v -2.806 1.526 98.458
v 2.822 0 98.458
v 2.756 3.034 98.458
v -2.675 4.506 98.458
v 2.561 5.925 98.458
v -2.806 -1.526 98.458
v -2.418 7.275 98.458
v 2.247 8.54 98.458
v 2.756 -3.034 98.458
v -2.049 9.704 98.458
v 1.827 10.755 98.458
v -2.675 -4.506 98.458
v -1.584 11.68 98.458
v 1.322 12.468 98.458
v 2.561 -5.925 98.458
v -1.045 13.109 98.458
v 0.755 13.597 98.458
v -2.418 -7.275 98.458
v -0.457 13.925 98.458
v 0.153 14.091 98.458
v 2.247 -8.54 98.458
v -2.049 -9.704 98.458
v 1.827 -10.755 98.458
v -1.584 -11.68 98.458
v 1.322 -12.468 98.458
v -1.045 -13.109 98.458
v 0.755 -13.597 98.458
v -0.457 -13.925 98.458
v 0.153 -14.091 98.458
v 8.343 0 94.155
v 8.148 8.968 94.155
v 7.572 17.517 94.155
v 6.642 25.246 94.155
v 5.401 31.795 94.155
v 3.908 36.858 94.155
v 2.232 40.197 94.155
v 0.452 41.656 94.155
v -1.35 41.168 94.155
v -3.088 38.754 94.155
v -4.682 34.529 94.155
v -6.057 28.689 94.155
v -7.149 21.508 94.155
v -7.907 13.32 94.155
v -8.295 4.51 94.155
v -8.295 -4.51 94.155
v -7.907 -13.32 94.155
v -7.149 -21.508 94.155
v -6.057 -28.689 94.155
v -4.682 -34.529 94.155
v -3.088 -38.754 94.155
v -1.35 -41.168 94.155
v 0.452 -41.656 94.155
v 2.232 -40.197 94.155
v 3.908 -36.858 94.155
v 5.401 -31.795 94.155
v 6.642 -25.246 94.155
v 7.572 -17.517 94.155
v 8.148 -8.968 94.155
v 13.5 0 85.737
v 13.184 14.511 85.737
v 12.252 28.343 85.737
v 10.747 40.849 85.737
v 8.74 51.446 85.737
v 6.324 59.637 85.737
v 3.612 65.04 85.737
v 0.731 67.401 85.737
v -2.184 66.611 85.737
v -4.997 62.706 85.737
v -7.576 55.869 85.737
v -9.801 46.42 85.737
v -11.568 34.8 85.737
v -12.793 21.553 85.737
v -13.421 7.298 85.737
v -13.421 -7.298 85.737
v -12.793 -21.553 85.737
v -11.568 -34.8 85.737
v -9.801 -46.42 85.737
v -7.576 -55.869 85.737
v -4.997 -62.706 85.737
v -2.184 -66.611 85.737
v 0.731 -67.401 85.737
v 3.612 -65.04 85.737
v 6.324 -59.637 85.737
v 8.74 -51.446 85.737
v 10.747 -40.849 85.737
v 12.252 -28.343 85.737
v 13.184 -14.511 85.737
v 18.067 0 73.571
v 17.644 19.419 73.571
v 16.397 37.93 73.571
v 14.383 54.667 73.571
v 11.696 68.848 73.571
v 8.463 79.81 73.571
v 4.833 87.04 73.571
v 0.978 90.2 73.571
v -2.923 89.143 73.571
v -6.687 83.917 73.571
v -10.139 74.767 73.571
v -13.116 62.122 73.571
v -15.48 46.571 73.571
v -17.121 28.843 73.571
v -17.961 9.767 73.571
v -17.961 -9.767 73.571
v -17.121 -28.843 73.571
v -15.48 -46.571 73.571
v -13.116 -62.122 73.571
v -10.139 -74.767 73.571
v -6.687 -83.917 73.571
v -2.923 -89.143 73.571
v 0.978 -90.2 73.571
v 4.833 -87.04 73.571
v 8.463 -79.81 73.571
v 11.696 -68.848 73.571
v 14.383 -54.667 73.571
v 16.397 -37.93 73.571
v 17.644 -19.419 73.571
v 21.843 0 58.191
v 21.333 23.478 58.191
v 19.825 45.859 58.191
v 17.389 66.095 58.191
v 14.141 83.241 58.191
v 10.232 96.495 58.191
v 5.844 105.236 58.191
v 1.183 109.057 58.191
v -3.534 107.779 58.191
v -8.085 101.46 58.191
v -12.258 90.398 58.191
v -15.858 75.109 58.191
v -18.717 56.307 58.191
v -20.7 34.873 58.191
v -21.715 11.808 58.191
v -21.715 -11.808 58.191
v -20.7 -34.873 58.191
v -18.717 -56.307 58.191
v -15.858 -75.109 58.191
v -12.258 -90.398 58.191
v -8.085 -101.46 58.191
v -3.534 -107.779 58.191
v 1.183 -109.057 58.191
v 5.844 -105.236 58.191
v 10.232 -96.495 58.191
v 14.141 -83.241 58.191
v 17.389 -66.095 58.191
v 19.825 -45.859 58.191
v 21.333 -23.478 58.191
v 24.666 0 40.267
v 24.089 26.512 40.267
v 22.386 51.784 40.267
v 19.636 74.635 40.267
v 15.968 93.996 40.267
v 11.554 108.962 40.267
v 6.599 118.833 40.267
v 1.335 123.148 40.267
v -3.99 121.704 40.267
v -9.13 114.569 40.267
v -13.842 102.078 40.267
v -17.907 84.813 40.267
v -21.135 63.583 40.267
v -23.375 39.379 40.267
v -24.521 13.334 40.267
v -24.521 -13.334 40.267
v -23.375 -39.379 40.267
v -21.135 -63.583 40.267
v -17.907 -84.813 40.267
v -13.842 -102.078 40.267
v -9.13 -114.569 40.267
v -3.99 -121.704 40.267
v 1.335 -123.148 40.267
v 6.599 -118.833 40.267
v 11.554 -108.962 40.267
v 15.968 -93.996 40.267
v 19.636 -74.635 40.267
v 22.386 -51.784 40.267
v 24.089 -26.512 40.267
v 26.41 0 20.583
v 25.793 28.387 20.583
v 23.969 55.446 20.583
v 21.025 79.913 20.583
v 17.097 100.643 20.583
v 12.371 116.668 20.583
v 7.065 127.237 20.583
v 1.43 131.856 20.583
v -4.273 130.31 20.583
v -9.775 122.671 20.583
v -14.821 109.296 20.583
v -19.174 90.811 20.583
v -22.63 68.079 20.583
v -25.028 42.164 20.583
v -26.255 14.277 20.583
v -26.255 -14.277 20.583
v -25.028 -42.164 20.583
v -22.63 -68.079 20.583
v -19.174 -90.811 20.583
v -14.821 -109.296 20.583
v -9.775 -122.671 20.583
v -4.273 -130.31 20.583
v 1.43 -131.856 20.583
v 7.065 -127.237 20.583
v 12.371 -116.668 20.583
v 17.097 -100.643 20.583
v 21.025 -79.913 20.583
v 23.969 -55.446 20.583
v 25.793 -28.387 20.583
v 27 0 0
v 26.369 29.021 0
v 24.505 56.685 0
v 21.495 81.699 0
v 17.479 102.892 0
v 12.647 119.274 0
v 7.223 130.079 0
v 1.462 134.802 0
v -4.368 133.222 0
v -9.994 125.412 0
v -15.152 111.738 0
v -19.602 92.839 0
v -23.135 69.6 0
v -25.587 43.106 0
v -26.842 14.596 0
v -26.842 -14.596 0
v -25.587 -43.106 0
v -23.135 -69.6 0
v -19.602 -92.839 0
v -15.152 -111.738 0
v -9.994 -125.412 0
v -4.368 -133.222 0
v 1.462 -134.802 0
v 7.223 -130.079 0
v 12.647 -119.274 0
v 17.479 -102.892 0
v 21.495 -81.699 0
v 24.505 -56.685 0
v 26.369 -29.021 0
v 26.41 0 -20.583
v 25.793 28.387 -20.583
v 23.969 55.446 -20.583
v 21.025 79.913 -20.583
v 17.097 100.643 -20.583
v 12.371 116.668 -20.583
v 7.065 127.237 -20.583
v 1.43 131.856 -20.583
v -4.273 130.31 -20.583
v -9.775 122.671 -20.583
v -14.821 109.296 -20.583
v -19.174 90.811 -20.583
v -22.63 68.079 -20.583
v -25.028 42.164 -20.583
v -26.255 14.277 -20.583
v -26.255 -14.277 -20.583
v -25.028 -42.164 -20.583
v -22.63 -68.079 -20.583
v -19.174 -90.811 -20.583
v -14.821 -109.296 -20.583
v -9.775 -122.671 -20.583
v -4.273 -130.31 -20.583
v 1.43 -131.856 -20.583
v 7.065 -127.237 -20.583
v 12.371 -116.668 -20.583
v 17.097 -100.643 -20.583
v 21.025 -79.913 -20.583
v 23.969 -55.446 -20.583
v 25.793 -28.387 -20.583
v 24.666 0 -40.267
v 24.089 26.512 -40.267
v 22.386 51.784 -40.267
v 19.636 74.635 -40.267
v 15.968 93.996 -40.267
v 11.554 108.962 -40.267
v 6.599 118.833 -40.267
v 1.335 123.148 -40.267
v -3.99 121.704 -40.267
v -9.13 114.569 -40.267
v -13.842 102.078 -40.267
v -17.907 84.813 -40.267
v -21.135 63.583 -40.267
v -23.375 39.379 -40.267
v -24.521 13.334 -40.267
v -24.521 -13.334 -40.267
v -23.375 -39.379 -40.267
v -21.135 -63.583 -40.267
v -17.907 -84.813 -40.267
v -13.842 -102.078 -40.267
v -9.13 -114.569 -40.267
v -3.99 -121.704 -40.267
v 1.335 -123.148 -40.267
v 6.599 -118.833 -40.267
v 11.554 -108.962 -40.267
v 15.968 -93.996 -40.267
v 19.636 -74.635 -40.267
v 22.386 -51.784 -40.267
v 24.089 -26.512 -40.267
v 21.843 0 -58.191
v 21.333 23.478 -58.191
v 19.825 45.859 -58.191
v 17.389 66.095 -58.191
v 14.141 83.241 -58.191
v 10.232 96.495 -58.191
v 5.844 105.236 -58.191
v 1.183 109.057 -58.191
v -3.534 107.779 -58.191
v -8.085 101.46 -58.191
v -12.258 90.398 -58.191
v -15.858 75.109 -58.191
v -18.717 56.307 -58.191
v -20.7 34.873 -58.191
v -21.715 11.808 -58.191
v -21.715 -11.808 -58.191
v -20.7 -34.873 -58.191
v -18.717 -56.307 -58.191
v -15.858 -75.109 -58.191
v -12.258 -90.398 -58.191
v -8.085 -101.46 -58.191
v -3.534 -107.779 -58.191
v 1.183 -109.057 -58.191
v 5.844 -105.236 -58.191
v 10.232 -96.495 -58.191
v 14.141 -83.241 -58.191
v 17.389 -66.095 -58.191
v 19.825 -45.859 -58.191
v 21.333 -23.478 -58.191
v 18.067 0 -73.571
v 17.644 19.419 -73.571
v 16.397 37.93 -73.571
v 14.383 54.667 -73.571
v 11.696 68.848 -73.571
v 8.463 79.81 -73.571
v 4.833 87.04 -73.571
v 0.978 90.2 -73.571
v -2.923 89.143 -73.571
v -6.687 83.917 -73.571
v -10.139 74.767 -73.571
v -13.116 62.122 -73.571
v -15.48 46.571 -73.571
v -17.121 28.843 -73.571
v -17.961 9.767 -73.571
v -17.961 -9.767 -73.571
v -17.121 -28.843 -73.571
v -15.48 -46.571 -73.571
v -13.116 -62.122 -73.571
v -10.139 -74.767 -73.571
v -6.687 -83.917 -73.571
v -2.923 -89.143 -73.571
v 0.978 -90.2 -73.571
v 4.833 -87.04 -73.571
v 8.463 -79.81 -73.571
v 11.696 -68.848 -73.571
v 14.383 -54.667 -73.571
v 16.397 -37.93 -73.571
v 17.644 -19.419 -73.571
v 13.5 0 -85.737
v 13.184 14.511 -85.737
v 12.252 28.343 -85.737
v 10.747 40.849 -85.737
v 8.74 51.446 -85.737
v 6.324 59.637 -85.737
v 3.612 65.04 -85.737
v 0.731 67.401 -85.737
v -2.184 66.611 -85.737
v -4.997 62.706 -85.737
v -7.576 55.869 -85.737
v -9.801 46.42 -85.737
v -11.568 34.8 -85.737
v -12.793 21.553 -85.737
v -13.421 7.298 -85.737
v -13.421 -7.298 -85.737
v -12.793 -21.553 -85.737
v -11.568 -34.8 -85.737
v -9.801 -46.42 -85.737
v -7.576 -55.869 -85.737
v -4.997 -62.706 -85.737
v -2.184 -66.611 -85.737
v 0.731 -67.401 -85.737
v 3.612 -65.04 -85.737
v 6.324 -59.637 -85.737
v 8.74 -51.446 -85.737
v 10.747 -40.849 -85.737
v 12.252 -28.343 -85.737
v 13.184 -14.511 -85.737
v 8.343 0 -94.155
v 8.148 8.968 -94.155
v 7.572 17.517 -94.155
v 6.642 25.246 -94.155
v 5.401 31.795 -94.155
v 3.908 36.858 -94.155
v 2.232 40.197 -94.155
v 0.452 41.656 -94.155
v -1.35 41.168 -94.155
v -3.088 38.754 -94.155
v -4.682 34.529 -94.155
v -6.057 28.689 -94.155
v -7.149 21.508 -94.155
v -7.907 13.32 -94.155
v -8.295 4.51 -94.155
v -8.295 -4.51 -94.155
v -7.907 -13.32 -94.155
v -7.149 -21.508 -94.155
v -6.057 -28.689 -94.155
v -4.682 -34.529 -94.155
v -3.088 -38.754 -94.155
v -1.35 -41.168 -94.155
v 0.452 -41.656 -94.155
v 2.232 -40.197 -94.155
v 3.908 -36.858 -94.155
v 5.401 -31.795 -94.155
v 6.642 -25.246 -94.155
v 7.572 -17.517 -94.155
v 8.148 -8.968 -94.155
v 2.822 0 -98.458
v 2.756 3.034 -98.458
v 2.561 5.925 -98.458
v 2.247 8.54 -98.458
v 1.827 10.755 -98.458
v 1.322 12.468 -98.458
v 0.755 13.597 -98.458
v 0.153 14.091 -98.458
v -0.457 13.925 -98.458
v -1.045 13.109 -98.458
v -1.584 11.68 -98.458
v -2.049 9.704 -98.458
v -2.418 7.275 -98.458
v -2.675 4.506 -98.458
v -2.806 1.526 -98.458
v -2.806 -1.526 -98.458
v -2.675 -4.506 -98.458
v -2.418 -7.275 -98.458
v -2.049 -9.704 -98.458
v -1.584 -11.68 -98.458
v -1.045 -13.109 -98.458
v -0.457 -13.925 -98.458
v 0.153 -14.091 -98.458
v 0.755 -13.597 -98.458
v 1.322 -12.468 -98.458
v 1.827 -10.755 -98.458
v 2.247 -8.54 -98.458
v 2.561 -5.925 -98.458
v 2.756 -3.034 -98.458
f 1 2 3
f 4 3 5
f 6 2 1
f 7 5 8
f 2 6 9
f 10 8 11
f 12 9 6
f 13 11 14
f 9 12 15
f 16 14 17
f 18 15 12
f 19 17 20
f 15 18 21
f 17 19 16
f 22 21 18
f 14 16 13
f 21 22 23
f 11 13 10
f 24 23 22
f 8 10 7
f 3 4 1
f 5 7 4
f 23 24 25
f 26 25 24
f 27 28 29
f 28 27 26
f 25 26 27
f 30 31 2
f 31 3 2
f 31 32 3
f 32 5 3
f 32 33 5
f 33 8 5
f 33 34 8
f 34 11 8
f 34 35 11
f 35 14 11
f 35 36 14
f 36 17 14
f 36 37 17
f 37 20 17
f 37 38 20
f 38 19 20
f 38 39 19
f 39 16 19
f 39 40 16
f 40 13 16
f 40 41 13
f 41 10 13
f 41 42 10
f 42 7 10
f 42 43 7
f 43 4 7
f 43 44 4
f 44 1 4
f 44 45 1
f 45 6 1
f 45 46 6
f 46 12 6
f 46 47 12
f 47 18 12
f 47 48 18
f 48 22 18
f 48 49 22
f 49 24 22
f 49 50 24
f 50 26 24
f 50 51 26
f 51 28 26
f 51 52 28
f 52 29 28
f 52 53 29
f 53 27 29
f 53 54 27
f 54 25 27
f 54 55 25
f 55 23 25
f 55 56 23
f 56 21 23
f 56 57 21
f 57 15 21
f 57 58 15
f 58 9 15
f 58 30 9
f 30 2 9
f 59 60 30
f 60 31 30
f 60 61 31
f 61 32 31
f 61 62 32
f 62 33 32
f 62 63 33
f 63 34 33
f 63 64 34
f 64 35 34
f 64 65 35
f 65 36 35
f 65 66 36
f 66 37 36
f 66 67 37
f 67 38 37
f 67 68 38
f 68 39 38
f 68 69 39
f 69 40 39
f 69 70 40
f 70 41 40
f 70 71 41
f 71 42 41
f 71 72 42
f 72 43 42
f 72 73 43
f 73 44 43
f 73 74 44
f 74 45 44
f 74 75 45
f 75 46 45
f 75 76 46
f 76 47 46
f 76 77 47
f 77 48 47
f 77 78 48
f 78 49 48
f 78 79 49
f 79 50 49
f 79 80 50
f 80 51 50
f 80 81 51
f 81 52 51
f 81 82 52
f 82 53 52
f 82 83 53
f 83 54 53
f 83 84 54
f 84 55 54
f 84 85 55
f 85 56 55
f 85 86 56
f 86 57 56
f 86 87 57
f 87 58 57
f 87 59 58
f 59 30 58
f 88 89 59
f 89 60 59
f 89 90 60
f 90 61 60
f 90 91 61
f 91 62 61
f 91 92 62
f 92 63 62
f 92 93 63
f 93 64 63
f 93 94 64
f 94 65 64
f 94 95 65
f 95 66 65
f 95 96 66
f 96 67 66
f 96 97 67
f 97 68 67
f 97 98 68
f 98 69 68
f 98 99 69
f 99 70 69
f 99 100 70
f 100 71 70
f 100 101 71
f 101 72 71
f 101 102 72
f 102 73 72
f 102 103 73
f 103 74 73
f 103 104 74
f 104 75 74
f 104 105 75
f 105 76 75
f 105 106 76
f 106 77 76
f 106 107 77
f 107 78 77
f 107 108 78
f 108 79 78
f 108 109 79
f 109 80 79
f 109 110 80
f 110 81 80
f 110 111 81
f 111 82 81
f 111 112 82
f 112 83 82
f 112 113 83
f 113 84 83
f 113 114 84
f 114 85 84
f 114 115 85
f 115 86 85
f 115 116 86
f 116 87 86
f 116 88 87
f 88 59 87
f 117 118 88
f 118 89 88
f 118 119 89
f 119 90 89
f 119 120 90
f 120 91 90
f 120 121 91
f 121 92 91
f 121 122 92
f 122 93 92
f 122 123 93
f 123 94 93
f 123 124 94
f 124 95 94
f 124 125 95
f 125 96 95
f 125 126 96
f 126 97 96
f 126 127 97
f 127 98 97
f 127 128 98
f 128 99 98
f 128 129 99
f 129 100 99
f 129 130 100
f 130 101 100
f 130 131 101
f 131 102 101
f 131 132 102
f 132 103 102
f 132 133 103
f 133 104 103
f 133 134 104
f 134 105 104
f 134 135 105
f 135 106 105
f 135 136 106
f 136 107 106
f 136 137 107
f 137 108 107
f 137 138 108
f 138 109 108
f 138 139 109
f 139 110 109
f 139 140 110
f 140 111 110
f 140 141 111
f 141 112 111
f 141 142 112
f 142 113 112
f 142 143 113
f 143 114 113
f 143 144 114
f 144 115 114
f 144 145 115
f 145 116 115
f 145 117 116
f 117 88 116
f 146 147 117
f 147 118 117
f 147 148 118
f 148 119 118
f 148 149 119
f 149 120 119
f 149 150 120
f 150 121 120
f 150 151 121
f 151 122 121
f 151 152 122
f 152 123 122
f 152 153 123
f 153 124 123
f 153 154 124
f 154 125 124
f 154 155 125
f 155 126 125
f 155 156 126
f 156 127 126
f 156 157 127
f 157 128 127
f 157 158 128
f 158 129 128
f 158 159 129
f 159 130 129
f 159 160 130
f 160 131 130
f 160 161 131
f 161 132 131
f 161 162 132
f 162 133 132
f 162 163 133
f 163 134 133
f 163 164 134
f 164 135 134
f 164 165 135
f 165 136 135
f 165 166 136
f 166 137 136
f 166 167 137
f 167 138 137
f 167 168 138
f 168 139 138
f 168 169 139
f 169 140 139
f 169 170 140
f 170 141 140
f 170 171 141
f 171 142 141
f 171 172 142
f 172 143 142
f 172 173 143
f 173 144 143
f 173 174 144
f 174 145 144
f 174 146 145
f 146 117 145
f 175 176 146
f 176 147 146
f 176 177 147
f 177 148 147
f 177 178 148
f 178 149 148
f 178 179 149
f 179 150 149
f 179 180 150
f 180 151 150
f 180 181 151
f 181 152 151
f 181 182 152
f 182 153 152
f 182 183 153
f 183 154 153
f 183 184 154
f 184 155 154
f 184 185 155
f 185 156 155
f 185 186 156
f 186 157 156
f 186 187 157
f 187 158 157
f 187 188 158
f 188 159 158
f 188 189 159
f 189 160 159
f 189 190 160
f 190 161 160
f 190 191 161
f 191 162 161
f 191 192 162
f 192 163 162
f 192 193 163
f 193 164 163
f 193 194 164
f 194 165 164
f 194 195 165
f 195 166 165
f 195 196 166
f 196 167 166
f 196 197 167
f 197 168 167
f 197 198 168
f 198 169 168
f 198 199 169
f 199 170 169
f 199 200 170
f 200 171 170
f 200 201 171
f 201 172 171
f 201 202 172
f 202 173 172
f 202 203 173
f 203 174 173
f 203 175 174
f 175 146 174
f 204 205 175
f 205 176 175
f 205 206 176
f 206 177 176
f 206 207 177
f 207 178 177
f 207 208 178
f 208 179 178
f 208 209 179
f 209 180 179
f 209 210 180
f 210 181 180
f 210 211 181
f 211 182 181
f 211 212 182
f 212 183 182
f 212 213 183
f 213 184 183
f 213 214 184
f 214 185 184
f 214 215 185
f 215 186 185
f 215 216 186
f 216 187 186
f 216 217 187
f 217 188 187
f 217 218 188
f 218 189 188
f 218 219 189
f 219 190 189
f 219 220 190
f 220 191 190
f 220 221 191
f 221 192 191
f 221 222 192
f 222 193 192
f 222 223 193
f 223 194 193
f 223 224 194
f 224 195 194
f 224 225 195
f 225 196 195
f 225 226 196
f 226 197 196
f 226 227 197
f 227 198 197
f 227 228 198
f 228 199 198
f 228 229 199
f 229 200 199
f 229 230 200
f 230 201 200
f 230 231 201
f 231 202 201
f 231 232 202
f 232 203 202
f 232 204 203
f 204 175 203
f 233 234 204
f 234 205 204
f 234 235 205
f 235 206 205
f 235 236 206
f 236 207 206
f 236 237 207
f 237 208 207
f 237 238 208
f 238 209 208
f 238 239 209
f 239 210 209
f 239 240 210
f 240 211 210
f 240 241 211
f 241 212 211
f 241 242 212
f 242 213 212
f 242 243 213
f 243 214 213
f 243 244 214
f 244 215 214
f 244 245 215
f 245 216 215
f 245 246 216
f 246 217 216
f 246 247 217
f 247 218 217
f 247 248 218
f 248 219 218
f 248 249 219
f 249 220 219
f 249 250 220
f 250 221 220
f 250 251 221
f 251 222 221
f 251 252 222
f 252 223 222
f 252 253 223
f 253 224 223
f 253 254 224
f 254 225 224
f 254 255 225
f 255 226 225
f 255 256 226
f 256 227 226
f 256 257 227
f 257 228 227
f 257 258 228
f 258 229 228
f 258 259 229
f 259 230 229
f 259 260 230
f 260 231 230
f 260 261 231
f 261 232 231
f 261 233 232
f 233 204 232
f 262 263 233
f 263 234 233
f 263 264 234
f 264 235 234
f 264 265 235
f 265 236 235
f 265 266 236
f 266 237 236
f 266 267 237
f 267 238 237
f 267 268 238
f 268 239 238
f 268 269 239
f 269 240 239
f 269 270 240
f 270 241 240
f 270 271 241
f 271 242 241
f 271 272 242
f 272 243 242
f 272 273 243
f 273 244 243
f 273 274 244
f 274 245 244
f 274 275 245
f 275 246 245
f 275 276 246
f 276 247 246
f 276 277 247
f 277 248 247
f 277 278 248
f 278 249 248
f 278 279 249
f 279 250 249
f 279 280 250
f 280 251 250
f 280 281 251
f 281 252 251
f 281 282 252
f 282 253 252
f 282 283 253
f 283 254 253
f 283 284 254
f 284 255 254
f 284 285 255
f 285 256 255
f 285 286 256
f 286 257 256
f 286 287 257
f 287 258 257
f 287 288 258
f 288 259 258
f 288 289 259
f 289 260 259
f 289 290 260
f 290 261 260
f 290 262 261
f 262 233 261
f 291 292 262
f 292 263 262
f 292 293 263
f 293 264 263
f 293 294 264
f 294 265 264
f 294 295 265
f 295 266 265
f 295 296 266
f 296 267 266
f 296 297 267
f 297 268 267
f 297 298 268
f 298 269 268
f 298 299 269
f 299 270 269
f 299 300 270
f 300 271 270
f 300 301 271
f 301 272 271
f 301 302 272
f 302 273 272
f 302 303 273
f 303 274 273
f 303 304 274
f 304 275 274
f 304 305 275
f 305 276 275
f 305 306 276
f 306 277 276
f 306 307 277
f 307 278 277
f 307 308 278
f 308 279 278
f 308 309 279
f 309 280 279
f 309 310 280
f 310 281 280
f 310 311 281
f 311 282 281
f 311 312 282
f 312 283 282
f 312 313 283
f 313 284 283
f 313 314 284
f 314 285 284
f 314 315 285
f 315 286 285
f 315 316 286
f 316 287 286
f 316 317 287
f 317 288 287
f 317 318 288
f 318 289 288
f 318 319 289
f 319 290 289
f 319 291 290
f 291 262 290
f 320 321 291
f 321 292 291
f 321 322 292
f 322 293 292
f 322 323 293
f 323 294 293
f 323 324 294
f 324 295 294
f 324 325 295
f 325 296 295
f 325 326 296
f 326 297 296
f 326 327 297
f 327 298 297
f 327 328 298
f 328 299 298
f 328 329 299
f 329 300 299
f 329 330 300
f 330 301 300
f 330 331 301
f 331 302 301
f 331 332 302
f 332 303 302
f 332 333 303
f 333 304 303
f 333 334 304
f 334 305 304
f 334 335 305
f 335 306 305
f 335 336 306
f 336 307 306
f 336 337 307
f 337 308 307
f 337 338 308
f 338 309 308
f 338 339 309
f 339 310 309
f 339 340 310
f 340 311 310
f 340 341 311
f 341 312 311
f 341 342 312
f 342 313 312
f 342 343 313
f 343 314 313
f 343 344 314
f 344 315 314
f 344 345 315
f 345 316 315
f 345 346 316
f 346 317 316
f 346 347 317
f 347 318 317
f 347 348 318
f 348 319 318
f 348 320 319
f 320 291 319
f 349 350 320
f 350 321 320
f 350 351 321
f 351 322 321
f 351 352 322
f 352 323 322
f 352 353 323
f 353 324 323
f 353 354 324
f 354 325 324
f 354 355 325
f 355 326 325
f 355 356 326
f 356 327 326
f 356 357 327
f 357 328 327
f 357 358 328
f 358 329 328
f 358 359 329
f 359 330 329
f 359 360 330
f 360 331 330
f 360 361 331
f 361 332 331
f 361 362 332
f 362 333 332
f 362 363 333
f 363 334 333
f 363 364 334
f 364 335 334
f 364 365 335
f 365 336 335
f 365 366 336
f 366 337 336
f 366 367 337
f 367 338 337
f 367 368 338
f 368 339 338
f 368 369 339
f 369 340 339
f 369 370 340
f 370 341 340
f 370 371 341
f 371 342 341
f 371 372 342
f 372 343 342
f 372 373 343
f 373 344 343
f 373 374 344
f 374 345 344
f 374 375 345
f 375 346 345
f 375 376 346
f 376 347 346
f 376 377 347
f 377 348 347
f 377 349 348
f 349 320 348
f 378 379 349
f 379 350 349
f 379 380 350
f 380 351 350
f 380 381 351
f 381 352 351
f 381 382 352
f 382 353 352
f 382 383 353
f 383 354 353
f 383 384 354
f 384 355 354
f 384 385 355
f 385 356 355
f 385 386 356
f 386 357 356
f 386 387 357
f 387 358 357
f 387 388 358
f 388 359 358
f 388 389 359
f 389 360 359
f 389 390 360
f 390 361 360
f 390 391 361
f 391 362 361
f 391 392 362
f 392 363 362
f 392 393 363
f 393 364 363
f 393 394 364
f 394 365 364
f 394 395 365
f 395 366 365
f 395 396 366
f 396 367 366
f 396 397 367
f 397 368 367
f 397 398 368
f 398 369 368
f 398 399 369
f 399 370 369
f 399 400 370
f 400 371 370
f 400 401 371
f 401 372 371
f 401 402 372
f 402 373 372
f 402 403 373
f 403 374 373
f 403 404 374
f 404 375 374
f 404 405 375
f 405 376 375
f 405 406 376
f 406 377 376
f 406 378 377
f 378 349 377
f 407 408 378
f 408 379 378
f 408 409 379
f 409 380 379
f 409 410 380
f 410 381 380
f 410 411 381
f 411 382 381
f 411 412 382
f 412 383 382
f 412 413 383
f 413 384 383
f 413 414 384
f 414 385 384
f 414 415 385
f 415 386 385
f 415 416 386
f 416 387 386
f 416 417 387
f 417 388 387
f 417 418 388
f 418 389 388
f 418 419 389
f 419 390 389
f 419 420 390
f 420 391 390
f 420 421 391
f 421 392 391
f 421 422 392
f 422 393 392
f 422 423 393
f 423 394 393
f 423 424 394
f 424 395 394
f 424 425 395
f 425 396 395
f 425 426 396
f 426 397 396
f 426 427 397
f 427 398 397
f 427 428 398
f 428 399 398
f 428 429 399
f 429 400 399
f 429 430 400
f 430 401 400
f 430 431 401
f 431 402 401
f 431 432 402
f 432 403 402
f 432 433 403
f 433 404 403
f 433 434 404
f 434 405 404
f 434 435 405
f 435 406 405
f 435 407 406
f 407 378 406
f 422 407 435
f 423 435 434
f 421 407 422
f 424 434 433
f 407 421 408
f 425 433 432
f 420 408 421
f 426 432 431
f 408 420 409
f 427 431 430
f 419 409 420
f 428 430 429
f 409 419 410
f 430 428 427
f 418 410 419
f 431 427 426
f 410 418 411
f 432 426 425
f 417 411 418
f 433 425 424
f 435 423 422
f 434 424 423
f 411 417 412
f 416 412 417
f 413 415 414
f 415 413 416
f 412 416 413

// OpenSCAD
// Generated by SolidPython 1.0.1 on 2020-07-29 00:46:45


scale(v = [3, 15, 11]) {
	sphere(r = 9);
}
/***********************************************
*********      SolidPython code:      **********
************************************************
 
# import packages: SolidPython
from solid import *
from solid.utils import *
from itertools import chain, combinations, permutations


class Resize:

    def __init__(self, scad_file):
        self.scad_file = scad_file
        #self.scad_file = import_scad(scad_file)
        # cone/cylinder param:
        self.r1 = 0
        self.r2 = 0
        self.h = 0
        # rectangular prism param:
        self.w = 0
        self.l = 0
        # ellipse param:
        self.r = 0

    # import OpenScad code (file name corresponds to shape)


    # classify shape + parameters
    def assign(self, param1, param2, param3):
        if self.scad_file == 'cone.scad':
            self.r1 = param1
            self.r2 = param2
            self.h = param3
        elif self.scad_file == 'cylinder.scad':
            self.r1 = param1
            self.r2 = param2
            self.h = param3
        elif self.scad_file == 'rectangularPrism.scad':
            self.h = param1
            self.l = param2
            self.w = param3
        else:
            self.r = param1
            self.h = param2

    # resize parameters
    def iterate(self):
        x = range(3, 20, 2)
        i = 1
        if self.scad_file == 'cone.scad':
            tempList = list(permutations(x, 2))
            for temp in tempList:
                param1 = temp[0]
                param2 = temp[1]
                filepath = 'produced_scad_files/' + 'cone' + str(param1) + '_' + str(param2) + '_' + '.scad'
                scad_render_to_file(cylinder(h=param1, r1=param2, r2=0), filepath)

        elif self.scad_file == 'cylinder.scad':
            tempList = list(permutations(x, 3))
            for temp in tempList:
                param1 = temp[0]
                param2 = temp[1]
                filepath = 'produced_scad_files/' + 'cylinder' + str(param1) + '_' + str(param2) + '_' + '.scad'
                scad_render_to_file(cylinder(h=param1, r1=param2, r2=param2), filepath)

        elif self.scad_file == 'rectangularPrism.scad':
            tempList = list(permutations(x, 3))
            for temp in tempList:
                param1 = temp[0]
                param2 = temp[1]
                param3 = temp[2]
                filepath = 'produced_scad_files/' + 'rectangularPrism' + str(param1) + '_' + str(param2) + '_' + str(
                    param3) + '.scad'
                scad_render_to_file(cube(size=(param1, param2, param3)), filepath)

        elif self.scad_file == 'ellipse.scad':
            tempList = list(permutations(x, 4))
            for temp in tempList:
                param1 = temp[0]
                param2 = temp[1]
                param3 = temp[2]
                param4 = temp[3]
                filepath = 'produced_scad_files/' + 'ellipse' + str(param1) + '_' + str(param2) + '_' + str(param3) + '_' + str(param4) + '.scad'
                scad_render_to_file(scale([param1, param2, param3])(sphere(r=param4)), filepath)

    def render_to_scadfile(self):
        scad_render_to_file(scad, 'example.scad') 
 
************************************************/
